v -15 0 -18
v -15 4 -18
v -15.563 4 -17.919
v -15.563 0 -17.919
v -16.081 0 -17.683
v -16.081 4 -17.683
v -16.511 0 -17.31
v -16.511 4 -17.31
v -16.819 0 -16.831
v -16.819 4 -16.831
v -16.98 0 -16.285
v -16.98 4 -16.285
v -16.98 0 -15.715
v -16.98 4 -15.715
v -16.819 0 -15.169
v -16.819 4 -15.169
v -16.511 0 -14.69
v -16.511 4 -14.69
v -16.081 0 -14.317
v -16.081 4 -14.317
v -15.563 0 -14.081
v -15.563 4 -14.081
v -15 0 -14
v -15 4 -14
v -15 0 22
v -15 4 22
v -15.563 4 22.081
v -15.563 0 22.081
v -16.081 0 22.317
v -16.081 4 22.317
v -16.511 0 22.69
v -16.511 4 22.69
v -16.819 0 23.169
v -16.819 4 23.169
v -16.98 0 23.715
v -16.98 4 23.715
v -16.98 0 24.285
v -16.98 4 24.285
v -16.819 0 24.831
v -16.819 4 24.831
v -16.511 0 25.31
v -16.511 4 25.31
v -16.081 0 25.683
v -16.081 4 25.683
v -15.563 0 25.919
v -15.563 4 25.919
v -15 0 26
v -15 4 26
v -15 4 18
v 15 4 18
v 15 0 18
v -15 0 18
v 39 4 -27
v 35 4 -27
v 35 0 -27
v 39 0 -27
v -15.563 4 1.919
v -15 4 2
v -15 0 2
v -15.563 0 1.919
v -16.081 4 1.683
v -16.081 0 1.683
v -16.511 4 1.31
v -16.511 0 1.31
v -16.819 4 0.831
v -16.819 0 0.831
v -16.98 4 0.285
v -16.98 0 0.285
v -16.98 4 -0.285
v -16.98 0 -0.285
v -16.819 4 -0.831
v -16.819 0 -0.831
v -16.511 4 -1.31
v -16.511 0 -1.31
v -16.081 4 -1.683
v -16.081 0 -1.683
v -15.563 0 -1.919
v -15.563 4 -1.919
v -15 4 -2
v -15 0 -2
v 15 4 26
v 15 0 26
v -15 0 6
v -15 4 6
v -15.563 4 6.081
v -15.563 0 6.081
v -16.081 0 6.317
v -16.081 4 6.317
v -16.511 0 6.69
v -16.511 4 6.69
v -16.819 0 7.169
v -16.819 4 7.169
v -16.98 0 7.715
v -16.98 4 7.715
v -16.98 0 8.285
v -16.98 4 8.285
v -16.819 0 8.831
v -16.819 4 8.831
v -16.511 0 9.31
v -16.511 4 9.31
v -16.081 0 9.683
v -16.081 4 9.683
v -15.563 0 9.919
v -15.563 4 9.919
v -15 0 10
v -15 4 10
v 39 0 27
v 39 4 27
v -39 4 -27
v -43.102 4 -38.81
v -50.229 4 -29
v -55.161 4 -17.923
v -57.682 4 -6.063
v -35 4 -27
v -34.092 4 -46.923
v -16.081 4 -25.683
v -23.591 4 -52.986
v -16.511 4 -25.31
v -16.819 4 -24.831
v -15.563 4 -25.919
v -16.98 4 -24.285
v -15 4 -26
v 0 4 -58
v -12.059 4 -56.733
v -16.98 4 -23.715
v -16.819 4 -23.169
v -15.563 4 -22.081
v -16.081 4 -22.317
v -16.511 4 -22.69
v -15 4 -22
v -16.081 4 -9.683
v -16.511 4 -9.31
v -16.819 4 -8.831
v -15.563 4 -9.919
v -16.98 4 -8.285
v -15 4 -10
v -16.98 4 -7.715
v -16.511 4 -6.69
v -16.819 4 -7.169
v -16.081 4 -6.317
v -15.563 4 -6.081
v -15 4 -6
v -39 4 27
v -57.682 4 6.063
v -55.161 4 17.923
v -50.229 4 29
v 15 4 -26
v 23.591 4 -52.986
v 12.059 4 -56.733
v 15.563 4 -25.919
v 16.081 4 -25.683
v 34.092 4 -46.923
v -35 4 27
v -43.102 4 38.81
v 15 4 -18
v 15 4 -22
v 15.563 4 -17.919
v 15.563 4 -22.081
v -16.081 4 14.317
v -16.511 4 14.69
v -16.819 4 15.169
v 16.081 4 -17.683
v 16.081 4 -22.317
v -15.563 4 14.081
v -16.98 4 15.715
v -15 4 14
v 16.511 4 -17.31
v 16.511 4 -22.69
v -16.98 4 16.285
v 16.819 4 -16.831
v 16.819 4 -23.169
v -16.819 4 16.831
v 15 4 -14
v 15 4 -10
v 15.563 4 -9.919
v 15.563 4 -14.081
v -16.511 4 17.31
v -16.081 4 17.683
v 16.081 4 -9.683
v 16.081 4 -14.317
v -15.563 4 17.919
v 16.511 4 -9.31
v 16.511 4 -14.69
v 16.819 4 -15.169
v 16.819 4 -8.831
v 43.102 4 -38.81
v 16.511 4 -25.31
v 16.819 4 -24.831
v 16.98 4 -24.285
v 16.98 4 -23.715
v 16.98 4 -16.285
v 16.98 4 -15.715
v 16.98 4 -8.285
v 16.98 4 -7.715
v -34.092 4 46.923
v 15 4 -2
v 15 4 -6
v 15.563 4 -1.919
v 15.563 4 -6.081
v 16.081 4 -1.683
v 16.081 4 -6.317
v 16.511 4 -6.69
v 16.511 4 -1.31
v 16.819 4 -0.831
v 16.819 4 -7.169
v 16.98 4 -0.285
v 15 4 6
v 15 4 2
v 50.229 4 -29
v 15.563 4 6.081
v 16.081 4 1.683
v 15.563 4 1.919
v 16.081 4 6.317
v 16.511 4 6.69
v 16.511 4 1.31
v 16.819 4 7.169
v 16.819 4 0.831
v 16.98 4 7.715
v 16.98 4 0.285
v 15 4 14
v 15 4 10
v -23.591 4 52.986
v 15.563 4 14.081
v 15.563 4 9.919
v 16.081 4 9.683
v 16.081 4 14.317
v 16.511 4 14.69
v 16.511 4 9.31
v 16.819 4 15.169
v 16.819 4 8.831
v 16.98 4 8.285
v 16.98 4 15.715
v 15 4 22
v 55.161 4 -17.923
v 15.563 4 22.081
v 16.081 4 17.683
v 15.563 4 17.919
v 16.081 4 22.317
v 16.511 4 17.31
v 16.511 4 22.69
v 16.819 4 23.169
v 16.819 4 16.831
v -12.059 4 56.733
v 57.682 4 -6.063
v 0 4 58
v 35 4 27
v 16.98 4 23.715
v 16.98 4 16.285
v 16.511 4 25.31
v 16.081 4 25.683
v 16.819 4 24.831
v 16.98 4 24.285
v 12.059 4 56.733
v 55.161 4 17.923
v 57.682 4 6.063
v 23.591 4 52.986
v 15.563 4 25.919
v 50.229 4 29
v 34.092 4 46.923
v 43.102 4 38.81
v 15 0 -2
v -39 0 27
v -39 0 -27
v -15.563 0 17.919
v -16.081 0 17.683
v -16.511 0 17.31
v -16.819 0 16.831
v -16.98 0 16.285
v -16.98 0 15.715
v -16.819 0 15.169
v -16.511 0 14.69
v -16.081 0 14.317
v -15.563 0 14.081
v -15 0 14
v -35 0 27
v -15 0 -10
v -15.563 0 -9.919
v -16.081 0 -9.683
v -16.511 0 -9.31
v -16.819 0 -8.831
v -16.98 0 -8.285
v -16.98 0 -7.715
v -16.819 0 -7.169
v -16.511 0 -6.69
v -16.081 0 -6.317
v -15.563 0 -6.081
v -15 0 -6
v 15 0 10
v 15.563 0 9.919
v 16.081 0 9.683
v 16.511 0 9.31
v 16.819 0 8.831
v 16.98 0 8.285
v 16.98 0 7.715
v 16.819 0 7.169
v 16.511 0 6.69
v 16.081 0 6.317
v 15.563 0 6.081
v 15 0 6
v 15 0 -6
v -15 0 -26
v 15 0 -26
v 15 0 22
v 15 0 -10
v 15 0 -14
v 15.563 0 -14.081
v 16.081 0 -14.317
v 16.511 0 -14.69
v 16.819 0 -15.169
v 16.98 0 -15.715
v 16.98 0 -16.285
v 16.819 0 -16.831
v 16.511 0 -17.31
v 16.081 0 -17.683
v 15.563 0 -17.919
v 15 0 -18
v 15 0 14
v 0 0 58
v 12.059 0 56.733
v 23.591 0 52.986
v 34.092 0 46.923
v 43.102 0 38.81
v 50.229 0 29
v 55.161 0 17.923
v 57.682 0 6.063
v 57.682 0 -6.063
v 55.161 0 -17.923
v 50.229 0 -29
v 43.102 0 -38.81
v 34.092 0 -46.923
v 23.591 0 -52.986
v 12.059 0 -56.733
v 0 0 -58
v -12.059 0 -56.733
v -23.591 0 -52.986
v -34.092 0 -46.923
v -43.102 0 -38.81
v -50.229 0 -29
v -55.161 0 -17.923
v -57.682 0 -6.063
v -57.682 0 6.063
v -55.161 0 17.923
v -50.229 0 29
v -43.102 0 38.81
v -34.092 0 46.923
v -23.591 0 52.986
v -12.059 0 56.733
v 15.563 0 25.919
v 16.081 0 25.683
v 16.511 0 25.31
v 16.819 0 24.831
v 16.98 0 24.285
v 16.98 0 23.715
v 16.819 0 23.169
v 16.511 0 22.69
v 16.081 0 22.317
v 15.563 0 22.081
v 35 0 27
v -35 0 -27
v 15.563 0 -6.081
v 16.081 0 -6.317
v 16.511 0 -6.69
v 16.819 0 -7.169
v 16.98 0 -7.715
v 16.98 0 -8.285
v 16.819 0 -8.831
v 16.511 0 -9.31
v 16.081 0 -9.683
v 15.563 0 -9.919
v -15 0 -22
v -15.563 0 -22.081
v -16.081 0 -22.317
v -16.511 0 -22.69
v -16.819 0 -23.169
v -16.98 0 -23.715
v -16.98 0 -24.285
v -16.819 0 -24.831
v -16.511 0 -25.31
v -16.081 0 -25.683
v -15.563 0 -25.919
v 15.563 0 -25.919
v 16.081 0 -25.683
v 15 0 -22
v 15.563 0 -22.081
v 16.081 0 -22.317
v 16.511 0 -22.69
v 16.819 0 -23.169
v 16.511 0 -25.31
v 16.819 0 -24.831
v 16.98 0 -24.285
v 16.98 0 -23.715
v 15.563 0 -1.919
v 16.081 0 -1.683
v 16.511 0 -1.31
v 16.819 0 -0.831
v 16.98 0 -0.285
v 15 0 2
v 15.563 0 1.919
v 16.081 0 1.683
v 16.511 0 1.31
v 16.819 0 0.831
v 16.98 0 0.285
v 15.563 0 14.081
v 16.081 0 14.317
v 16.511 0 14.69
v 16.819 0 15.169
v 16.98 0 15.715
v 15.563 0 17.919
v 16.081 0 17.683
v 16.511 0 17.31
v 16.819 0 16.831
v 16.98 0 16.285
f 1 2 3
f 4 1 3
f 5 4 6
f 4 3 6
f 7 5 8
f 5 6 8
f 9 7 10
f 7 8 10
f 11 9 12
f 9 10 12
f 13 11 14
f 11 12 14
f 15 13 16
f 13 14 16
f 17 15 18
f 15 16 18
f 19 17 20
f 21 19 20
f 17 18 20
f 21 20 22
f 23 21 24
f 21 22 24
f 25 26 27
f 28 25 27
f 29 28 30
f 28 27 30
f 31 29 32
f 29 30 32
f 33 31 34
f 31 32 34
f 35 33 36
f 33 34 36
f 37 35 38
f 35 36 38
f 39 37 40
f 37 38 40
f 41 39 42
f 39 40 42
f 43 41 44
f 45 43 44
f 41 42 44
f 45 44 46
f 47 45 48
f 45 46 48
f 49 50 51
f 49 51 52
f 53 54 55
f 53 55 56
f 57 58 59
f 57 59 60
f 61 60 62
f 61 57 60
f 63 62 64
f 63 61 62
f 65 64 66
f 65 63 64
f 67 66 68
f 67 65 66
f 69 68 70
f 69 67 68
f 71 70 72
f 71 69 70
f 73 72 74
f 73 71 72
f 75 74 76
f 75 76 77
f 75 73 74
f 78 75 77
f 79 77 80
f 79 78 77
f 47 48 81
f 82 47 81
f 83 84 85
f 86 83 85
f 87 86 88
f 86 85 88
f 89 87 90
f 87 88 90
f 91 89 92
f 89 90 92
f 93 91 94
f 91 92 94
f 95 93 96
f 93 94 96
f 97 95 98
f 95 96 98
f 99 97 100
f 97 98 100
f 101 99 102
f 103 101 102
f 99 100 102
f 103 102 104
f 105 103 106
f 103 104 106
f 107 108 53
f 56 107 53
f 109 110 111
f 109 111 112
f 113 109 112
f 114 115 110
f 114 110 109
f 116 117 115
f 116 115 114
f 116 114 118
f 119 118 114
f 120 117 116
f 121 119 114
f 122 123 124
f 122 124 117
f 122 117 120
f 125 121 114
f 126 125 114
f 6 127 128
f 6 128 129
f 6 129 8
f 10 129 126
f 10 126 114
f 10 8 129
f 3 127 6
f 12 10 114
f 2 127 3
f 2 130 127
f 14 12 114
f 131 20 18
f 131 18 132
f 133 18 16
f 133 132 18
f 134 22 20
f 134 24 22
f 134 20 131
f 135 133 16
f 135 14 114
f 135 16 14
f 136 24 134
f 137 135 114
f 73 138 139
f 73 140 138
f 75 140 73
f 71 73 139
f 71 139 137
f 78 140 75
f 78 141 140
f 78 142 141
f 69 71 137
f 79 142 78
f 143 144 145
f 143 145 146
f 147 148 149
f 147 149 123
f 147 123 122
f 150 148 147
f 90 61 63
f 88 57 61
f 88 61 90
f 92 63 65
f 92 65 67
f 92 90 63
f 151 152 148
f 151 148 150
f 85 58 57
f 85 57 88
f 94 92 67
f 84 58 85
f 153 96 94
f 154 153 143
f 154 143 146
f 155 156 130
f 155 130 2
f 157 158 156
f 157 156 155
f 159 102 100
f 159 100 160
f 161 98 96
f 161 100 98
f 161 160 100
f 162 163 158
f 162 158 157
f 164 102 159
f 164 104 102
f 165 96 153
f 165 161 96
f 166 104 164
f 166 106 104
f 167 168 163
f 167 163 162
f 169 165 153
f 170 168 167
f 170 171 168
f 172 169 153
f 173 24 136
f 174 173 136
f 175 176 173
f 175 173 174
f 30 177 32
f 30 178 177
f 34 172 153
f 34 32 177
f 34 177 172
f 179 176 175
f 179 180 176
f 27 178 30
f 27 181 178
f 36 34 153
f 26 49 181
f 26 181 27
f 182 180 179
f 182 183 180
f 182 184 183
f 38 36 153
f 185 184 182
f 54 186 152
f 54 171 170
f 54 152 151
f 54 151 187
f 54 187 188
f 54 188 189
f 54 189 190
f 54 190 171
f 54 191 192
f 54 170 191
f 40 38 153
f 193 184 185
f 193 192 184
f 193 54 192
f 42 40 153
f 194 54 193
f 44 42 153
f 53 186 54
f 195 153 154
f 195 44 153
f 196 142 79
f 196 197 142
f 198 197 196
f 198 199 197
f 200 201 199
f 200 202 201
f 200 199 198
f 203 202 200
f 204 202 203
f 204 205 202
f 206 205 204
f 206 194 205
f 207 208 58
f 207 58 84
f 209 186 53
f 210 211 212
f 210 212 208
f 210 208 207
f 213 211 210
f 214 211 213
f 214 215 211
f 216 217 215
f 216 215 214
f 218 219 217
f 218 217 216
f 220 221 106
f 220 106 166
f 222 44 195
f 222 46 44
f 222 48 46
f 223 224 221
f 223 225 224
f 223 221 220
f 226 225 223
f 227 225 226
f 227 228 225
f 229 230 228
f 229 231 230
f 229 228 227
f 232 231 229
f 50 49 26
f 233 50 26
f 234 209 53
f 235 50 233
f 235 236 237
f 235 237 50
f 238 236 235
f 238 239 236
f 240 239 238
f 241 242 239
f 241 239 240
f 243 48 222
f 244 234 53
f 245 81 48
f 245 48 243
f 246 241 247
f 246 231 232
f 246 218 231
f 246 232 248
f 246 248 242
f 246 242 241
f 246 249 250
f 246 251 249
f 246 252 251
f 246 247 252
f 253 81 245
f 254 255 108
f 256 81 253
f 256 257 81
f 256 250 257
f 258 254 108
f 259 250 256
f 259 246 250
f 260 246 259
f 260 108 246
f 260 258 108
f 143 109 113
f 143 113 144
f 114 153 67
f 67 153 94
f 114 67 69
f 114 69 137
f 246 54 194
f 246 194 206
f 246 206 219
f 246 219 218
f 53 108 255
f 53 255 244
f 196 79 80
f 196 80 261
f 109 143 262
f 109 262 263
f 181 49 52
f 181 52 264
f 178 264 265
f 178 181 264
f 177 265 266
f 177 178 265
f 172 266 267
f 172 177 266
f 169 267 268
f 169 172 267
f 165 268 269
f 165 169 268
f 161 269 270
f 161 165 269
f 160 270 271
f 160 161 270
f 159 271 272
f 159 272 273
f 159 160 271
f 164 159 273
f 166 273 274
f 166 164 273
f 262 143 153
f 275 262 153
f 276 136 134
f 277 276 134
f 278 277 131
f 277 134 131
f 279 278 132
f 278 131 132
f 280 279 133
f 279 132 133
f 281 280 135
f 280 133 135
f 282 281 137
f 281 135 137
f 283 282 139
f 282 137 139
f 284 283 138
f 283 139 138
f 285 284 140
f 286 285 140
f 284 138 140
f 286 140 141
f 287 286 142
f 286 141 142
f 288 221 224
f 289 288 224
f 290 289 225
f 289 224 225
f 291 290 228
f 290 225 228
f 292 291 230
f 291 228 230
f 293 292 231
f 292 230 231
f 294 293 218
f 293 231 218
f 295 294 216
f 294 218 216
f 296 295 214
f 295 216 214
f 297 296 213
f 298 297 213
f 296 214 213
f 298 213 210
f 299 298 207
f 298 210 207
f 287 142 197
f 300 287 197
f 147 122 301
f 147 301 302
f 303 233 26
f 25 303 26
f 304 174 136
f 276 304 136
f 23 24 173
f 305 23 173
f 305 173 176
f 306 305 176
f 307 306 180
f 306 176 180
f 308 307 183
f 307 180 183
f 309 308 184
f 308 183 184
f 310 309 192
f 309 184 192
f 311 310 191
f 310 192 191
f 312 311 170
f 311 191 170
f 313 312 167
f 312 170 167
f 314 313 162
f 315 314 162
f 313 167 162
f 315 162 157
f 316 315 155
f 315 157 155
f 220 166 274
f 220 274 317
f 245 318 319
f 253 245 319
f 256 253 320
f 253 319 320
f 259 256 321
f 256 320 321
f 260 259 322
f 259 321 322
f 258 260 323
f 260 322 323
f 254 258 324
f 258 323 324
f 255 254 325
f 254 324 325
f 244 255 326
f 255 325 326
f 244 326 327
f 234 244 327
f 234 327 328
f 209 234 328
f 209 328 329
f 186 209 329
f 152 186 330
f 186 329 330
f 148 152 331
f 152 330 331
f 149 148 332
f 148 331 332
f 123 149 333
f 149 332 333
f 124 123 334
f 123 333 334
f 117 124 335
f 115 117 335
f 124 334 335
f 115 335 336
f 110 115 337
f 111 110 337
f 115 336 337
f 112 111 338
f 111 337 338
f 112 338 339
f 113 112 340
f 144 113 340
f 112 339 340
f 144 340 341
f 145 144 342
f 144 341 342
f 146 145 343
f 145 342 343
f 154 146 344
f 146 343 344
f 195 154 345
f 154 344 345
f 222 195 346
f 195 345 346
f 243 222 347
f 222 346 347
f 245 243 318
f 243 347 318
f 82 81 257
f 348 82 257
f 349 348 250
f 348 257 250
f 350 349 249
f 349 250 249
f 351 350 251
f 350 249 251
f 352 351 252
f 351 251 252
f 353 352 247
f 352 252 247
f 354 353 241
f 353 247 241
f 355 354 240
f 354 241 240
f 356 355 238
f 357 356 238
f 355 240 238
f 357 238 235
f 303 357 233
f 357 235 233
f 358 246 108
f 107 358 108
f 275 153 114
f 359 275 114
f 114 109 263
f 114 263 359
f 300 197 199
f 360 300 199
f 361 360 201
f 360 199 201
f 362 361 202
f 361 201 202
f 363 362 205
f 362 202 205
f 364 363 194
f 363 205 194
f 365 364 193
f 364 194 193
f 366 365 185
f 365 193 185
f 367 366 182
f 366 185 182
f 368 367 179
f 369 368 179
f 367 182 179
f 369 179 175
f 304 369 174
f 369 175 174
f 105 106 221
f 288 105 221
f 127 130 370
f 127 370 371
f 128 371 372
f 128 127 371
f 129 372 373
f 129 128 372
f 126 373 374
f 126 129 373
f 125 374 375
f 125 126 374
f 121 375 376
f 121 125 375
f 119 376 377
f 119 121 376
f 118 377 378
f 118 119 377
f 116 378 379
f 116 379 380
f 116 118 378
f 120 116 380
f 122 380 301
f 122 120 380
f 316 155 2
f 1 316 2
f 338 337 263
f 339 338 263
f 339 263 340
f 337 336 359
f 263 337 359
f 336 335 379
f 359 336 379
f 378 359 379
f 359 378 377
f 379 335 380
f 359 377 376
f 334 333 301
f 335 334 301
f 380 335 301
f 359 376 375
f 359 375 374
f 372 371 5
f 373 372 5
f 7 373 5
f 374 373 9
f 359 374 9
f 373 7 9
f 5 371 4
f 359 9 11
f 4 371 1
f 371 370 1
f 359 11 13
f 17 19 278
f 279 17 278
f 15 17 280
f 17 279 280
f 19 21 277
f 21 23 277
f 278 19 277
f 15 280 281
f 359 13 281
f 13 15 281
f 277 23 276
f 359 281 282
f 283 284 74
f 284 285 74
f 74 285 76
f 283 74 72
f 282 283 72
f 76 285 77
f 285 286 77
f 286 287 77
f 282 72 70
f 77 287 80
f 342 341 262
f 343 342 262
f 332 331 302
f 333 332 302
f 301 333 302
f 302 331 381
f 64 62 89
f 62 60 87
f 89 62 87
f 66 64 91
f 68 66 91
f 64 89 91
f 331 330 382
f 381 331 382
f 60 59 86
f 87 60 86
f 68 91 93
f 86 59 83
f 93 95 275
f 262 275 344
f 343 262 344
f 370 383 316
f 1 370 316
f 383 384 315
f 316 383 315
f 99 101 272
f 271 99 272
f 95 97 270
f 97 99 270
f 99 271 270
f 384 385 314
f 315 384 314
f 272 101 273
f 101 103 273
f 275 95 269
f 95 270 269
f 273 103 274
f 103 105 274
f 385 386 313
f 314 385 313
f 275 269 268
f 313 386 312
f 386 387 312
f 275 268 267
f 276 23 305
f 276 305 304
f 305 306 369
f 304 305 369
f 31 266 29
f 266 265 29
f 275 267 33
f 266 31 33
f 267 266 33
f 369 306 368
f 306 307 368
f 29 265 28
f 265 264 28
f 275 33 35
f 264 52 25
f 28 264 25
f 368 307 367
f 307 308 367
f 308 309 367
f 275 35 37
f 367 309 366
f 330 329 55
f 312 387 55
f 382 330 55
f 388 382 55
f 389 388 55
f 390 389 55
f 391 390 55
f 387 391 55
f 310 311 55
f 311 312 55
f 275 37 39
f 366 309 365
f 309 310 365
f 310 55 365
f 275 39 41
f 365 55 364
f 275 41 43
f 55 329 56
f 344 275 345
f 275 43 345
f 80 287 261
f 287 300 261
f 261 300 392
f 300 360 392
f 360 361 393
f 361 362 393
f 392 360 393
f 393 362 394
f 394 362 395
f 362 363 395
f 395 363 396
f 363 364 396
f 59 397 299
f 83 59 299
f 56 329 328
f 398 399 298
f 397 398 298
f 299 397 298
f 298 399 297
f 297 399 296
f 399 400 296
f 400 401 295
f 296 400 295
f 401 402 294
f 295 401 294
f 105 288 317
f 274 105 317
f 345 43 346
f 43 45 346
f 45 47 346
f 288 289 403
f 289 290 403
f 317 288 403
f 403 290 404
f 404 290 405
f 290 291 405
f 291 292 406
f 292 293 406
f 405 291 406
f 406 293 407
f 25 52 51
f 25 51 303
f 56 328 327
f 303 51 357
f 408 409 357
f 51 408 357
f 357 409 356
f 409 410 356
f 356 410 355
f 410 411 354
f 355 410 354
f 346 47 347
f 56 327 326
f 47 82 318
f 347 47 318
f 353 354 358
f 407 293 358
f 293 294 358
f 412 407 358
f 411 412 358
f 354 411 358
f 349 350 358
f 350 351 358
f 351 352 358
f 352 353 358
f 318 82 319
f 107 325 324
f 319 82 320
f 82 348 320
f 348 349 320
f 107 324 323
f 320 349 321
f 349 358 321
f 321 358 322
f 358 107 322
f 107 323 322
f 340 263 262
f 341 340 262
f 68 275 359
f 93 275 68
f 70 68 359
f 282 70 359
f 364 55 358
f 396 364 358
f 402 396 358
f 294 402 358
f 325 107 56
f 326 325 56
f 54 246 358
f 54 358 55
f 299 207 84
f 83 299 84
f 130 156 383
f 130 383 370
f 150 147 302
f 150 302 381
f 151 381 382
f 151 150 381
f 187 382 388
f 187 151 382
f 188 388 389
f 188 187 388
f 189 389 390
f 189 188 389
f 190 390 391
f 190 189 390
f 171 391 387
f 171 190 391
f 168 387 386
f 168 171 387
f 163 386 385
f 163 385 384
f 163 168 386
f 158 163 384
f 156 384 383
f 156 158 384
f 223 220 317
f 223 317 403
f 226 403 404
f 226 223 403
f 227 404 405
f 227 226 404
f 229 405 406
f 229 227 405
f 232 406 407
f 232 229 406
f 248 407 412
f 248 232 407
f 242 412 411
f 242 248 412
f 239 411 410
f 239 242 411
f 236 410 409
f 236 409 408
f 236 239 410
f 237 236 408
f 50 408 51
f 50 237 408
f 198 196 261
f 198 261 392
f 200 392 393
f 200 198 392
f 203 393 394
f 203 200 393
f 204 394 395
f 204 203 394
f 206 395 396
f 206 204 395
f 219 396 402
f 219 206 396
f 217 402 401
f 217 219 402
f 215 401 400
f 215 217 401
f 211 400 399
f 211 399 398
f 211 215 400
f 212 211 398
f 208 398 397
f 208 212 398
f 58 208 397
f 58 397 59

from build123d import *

# Parameters (mm, degrees)
SKETCH1_R           = 58
BOSS_EXTRUDE1_DEPTH = 4
SKETCH2_W           = 4
SKETCH2_H           = 54
CUT_EXTRUDE1_DEPTH  = 83.121860671
CUT_EXTRUDE2_DEPTH  = 4


with BuildPart() as part:
    # Sketch1 → Boss-Extrude1 (new body)
    with BuildSketch(Plane(origin=(0, 0, 0), x_dir=(1, 0, 0), z_dir=(0, 1, 0))):
        with Locations(Location((0, 0, 0), (0, 0, 270))):
            Circle(SKETCH1_R)
    extrude(amount=BOSS_EXTRUDE1_DEPTH)

    # Sketch2 → Cut-Extrude1 (cut, through all)
    with BuildSketch(Plane(origin=(0, 4, 0), x_dir=(1, 0, 0), z_dir=(0, 1, 0))):
        with Locations((37, 0)):
            Rectangle(SKETCH2_W, SKETCH2_H)
        with Locations((-37, 0)):
            Rectangle(SKETCH2_W, SKETCH2_H)
    extrude(amount=-CUT_EXTRUDE1_DEPTH, mode=Mode.SUBTRACT)

    # Sketch3 → Cut-Extrude2 (cut)
    with BuildSketch(Plane(origin=(0, 4, 0), x_dir=(1, 0, 0), z_dir=(0, 1, 0))):
        with BuildLine():
            Line((-15, 6), (15, 6))
            ThreePointArc((15, 6), (17, 8), (15, 10))
            Line((15, 10), (-15, 10))
            ThreePointArc((-15, 10), (-17, 8), (-15, 6))
        make_face()
        with BuildLine():
            Line((-15, 14), (15, 14))
            ThreePointArc((15, 14), (17, 16), (15, 18))
            Line((15, 18), (-15, 18))
            ThreePointArc((-15, 18), (-17, 16), (-15, 14))
        make_face()
        with BuildLine():
            Line((-15, -10), (15, -10))
            ThreePointArc((15, -10), (17, -8), (15, -6))
            Line((15, -6), (-15, -6))
            ThreePointArc((-15, -6), (-17, -8), (-15, -10))
        make_face()
        with BuildLine():
            Line((-15, -26), (15, -26))
            ThreePointArc((15, -26), (17, -24), (15, -22))
            Line((15, -22), (-15, -22))
            ThreePointArc((-15, -22), (-17, -24), (-15, -26))
        make_face()
        with BuildLine():
            Line((-15, 2), (15, 2))
            ThreePointArc((15, 2), (17, 0), (15, -2))
            Line((15, -2), (-15, -2))
            ThreePointArc((-15, -2), (-17, 0), (-15, 2))
        make_face()
        with BuildLine():
            Line((-15, 26), (15, 26))
            ThreePointArc((15, 26), (17, 24), (15, 22))
            Line((15, 22), (-15, 22))
            ThreePointArc((-15, 22), (-17, 24), (-15, 26))
        make_face()
        with BuildLine():
            Line((-15, -14), (15, -14))
            ThreePointArc((15, -14), (17, -16), (15, -18))
            Line((15, -18), (-15, -18))
            ThreePointArc((-15, -18), (-17, -16), (-15, -14))
        make_face()
    extrude(amount=-CUT_EXTRUDE2_DEPTH, mode=Mode.SUBTRACT)


solid = part.part
